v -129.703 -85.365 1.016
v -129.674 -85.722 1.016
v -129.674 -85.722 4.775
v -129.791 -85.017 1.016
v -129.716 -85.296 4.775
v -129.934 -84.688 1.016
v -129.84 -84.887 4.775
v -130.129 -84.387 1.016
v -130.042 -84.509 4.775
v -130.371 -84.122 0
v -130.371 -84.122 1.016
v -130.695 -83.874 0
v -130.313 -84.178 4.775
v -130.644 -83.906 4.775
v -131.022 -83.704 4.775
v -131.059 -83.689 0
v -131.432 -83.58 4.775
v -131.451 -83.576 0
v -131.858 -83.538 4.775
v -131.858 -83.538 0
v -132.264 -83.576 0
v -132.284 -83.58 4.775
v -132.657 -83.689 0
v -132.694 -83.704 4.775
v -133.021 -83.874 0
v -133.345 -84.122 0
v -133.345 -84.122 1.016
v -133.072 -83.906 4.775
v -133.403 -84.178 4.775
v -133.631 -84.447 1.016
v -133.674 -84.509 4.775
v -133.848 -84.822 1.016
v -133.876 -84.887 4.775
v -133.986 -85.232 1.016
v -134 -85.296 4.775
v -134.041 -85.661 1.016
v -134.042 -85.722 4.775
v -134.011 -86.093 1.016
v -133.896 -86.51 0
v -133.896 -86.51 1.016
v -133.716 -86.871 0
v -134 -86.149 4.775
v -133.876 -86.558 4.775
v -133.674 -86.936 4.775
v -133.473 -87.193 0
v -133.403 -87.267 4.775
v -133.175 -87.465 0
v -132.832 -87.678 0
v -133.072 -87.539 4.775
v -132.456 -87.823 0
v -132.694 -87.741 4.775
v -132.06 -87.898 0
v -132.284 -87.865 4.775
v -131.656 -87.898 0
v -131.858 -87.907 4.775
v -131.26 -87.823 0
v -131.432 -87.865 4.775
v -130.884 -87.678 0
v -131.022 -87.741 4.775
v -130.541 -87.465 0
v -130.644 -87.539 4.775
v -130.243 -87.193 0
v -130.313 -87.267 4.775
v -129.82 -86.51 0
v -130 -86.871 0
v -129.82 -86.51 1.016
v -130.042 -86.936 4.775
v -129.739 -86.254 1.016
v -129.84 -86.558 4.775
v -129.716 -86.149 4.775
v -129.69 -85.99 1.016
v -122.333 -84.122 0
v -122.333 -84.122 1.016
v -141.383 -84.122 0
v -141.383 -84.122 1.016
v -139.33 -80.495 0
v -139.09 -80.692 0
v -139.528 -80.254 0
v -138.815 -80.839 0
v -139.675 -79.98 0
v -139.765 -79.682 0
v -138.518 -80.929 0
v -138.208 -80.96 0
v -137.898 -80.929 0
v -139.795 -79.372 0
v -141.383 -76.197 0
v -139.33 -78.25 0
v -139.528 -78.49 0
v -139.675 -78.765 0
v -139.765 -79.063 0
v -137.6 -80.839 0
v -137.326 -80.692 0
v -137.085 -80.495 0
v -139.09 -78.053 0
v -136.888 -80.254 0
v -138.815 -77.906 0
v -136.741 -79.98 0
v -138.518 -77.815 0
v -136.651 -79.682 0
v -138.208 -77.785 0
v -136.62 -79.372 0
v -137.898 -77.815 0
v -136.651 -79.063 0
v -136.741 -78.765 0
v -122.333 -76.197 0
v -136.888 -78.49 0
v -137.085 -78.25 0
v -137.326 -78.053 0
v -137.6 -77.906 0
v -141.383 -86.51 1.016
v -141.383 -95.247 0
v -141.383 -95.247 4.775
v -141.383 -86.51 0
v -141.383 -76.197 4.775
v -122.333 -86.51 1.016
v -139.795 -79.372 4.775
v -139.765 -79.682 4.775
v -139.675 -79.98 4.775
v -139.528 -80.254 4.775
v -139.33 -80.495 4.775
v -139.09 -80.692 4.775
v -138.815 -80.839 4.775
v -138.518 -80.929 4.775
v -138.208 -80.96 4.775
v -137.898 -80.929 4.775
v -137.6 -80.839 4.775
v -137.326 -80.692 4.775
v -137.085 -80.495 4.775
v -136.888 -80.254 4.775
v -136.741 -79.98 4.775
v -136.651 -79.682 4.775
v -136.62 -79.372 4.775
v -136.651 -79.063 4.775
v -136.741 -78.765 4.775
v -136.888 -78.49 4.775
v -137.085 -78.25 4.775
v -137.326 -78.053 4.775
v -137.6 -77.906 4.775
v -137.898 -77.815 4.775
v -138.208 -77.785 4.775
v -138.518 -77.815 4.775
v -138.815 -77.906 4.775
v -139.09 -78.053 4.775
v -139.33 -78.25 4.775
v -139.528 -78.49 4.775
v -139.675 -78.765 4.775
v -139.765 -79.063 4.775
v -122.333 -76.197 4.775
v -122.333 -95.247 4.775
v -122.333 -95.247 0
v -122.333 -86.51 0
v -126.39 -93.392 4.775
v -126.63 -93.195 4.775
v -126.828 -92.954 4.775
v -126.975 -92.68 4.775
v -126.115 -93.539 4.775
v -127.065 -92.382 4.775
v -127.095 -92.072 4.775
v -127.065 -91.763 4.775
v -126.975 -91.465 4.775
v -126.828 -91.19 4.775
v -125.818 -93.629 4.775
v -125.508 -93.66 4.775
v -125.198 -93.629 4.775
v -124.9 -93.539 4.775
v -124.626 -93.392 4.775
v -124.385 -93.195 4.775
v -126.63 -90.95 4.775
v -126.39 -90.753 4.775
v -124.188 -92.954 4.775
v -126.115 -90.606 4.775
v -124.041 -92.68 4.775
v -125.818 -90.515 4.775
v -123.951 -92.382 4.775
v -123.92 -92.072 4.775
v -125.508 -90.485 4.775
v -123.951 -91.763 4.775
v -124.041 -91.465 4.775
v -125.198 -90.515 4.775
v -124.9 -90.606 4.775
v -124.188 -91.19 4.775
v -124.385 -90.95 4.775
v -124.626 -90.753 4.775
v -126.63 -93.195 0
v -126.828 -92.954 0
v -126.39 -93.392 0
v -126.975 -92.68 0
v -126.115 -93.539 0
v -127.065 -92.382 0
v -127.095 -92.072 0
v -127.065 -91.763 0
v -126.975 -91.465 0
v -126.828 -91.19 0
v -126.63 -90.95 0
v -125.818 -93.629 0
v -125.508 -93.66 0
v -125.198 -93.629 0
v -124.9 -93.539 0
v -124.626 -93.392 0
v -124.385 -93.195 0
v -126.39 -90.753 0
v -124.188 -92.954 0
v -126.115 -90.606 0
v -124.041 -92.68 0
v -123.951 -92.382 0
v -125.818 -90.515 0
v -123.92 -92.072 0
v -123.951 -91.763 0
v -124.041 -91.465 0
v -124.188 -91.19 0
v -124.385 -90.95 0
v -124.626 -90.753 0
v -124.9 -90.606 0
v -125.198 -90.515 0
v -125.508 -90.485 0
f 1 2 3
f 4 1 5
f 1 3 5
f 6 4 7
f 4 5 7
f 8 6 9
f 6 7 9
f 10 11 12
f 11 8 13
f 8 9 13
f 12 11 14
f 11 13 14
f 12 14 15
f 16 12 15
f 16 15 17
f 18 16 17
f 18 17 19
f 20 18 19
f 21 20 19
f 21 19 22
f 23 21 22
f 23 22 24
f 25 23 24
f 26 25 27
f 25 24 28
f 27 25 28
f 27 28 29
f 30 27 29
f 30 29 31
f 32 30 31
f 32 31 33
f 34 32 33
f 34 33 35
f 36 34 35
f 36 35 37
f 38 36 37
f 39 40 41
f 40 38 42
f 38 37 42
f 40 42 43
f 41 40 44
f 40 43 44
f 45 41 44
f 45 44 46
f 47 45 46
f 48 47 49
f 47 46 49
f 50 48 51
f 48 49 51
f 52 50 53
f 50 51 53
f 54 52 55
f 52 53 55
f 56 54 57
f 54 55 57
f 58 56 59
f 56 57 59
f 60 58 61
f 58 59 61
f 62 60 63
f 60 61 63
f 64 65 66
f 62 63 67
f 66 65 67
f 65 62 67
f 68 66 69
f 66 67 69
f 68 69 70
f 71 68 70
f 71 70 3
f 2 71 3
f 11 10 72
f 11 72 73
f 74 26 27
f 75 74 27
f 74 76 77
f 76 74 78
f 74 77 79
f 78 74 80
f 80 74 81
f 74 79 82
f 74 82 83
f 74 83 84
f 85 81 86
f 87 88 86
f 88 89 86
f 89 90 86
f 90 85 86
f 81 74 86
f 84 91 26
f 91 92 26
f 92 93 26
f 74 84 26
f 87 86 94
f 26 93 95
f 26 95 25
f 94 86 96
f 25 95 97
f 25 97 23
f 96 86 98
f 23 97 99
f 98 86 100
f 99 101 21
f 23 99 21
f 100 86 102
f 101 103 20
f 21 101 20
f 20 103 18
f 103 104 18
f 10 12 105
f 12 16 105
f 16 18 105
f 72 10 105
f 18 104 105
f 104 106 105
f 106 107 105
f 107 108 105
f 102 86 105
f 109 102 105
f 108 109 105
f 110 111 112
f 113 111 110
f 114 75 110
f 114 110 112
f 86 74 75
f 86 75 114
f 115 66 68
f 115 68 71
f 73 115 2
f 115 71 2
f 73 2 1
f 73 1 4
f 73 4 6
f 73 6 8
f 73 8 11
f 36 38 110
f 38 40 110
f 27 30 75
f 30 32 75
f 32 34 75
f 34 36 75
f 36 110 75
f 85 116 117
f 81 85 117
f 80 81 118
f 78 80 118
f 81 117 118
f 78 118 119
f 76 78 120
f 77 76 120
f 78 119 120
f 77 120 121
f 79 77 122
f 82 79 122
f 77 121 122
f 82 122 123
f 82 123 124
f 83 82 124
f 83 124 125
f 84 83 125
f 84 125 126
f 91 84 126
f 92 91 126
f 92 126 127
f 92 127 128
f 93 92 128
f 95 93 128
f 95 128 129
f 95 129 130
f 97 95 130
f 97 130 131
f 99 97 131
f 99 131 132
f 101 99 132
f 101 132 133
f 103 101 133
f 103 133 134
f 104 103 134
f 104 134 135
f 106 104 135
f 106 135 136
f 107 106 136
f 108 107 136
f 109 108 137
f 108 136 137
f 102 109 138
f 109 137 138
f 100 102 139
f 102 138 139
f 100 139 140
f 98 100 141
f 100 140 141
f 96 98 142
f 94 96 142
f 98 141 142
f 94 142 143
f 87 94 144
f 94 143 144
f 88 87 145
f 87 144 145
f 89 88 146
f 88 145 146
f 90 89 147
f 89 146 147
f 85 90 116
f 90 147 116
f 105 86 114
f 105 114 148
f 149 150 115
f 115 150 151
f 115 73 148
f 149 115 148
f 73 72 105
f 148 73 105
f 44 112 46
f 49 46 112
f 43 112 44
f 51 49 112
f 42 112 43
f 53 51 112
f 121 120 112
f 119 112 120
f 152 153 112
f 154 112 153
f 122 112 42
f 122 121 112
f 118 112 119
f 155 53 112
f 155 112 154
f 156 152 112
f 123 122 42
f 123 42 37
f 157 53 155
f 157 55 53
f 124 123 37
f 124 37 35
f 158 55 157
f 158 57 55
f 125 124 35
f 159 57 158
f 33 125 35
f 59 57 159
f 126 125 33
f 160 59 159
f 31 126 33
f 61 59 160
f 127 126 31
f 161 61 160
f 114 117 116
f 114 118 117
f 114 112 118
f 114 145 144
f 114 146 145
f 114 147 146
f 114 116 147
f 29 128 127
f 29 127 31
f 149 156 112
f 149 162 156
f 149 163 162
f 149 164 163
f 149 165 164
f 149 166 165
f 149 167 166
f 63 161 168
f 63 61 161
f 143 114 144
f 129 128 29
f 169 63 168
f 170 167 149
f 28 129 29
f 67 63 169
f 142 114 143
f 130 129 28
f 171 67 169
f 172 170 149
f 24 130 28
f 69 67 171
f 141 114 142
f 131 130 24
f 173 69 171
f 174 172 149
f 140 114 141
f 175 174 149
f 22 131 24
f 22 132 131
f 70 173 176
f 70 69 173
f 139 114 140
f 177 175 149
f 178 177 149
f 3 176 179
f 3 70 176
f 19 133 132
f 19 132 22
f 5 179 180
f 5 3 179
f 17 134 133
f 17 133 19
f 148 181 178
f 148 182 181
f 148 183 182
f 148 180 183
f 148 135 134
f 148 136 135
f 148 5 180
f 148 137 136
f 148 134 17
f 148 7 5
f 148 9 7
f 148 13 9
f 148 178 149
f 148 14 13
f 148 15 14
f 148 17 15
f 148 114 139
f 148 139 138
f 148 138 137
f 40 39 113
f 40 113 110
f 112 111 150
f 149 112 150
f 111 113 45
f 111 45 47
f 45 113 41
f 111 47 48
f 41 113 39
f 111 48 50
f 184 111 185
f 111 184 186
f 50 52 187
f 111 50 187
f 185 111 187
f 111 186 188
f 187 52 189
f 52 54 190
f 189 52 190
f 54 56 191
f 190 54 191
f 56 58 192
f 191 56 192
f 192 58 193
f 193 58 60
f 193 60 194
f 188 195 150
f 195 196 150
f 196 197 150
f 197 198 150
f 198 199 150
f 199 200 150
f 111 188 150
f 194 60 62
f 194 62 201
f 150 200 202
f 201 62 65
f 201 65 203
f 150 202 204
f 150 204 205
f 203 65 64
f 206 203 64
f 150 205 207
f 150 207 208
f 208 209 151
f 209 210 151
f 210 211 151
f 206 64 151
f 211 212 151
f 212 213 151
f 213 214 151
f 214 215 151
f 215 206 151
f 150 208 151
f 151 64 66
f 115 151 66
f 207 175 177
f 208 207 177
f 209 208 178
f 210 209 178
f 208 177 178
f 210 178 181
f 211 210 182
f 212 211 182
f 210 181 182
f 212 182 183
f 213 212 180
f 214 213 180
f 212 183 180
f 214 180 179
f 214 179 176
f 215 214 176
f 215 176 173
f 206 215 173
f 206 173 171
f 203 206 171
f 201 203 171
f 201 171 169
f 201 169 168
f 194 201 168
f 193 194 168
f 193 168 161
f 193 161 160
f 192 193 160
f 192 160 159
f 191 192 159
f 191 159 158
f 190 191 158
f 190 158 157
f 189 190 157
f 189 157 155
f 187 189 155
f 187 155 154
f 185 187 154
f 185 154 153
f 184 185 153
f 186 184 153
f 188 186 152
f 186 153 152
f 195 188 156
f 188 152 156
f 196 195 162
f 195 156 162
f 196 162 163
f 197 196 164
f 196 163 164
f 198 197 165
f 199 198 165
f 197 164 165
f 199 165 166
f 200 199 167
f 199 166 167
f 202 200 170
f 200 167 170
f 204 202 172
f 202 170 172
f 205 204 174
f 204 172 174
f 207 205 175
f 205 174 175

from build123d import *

# Parameters (mm, degrees)
SKETCH1_W      = 19.05
SKETCH1_H      = 19.05
EXTRUDE1_DEPTH = 4.7752
SKETCH2_R      = 2.1844
SKETCH2_R_2    = 1.5875
EXTRUDE2_DEPTH = 5.7752
SKETCH4_W      = 1.016
SKETCH4_H      = 2.3876
EXTRUDE3_DEPTH = 20.05


with BuildPart() as part:
    # Sketch1 → Extrude1 (new body)
    with BuildSketch(Plane.XY):
        with Locations((-131.857958108, -85.722466515)):
            Rectangle(SKETCH1_W, SKETCH1_H)
    extrude(amount=EXTRUDE1_DEPTH)

    # Sketch2 → Extrude2 (cut, through all)
    with BuildSketch(Plane.XY.offset(4.7752)):
        with Locations((-131.857958108, -85.722466515)):
            Circle(SKETCH2_R)
        with Locations((-125.507958108, -92.072466515)):
            Circle(SKETCH2_R_2)
        with Locations(Location((-138.207958108, -79.372466515, 0), (0, 0, 180))):  # turned: the seam where the file's is
            Circle(SKETCH2_R_2)
    extrude(amount=-EXTRUDE2_DEPTH, mode=Mode.SUBTRACT)

    # Sketch4 → Extrude3 (cut, through all)
    with BuildSketch(Plane.ZY.offset(141.382958108)):
        with Locations((0.508, -85.316066515)):
            Rectangle(SKETCH4_W, SKETCH4_H)
    extrude(amount=-EXTRUDE3_DEPTH, mode=Mode.SUBTRACT)


solid = part.part
